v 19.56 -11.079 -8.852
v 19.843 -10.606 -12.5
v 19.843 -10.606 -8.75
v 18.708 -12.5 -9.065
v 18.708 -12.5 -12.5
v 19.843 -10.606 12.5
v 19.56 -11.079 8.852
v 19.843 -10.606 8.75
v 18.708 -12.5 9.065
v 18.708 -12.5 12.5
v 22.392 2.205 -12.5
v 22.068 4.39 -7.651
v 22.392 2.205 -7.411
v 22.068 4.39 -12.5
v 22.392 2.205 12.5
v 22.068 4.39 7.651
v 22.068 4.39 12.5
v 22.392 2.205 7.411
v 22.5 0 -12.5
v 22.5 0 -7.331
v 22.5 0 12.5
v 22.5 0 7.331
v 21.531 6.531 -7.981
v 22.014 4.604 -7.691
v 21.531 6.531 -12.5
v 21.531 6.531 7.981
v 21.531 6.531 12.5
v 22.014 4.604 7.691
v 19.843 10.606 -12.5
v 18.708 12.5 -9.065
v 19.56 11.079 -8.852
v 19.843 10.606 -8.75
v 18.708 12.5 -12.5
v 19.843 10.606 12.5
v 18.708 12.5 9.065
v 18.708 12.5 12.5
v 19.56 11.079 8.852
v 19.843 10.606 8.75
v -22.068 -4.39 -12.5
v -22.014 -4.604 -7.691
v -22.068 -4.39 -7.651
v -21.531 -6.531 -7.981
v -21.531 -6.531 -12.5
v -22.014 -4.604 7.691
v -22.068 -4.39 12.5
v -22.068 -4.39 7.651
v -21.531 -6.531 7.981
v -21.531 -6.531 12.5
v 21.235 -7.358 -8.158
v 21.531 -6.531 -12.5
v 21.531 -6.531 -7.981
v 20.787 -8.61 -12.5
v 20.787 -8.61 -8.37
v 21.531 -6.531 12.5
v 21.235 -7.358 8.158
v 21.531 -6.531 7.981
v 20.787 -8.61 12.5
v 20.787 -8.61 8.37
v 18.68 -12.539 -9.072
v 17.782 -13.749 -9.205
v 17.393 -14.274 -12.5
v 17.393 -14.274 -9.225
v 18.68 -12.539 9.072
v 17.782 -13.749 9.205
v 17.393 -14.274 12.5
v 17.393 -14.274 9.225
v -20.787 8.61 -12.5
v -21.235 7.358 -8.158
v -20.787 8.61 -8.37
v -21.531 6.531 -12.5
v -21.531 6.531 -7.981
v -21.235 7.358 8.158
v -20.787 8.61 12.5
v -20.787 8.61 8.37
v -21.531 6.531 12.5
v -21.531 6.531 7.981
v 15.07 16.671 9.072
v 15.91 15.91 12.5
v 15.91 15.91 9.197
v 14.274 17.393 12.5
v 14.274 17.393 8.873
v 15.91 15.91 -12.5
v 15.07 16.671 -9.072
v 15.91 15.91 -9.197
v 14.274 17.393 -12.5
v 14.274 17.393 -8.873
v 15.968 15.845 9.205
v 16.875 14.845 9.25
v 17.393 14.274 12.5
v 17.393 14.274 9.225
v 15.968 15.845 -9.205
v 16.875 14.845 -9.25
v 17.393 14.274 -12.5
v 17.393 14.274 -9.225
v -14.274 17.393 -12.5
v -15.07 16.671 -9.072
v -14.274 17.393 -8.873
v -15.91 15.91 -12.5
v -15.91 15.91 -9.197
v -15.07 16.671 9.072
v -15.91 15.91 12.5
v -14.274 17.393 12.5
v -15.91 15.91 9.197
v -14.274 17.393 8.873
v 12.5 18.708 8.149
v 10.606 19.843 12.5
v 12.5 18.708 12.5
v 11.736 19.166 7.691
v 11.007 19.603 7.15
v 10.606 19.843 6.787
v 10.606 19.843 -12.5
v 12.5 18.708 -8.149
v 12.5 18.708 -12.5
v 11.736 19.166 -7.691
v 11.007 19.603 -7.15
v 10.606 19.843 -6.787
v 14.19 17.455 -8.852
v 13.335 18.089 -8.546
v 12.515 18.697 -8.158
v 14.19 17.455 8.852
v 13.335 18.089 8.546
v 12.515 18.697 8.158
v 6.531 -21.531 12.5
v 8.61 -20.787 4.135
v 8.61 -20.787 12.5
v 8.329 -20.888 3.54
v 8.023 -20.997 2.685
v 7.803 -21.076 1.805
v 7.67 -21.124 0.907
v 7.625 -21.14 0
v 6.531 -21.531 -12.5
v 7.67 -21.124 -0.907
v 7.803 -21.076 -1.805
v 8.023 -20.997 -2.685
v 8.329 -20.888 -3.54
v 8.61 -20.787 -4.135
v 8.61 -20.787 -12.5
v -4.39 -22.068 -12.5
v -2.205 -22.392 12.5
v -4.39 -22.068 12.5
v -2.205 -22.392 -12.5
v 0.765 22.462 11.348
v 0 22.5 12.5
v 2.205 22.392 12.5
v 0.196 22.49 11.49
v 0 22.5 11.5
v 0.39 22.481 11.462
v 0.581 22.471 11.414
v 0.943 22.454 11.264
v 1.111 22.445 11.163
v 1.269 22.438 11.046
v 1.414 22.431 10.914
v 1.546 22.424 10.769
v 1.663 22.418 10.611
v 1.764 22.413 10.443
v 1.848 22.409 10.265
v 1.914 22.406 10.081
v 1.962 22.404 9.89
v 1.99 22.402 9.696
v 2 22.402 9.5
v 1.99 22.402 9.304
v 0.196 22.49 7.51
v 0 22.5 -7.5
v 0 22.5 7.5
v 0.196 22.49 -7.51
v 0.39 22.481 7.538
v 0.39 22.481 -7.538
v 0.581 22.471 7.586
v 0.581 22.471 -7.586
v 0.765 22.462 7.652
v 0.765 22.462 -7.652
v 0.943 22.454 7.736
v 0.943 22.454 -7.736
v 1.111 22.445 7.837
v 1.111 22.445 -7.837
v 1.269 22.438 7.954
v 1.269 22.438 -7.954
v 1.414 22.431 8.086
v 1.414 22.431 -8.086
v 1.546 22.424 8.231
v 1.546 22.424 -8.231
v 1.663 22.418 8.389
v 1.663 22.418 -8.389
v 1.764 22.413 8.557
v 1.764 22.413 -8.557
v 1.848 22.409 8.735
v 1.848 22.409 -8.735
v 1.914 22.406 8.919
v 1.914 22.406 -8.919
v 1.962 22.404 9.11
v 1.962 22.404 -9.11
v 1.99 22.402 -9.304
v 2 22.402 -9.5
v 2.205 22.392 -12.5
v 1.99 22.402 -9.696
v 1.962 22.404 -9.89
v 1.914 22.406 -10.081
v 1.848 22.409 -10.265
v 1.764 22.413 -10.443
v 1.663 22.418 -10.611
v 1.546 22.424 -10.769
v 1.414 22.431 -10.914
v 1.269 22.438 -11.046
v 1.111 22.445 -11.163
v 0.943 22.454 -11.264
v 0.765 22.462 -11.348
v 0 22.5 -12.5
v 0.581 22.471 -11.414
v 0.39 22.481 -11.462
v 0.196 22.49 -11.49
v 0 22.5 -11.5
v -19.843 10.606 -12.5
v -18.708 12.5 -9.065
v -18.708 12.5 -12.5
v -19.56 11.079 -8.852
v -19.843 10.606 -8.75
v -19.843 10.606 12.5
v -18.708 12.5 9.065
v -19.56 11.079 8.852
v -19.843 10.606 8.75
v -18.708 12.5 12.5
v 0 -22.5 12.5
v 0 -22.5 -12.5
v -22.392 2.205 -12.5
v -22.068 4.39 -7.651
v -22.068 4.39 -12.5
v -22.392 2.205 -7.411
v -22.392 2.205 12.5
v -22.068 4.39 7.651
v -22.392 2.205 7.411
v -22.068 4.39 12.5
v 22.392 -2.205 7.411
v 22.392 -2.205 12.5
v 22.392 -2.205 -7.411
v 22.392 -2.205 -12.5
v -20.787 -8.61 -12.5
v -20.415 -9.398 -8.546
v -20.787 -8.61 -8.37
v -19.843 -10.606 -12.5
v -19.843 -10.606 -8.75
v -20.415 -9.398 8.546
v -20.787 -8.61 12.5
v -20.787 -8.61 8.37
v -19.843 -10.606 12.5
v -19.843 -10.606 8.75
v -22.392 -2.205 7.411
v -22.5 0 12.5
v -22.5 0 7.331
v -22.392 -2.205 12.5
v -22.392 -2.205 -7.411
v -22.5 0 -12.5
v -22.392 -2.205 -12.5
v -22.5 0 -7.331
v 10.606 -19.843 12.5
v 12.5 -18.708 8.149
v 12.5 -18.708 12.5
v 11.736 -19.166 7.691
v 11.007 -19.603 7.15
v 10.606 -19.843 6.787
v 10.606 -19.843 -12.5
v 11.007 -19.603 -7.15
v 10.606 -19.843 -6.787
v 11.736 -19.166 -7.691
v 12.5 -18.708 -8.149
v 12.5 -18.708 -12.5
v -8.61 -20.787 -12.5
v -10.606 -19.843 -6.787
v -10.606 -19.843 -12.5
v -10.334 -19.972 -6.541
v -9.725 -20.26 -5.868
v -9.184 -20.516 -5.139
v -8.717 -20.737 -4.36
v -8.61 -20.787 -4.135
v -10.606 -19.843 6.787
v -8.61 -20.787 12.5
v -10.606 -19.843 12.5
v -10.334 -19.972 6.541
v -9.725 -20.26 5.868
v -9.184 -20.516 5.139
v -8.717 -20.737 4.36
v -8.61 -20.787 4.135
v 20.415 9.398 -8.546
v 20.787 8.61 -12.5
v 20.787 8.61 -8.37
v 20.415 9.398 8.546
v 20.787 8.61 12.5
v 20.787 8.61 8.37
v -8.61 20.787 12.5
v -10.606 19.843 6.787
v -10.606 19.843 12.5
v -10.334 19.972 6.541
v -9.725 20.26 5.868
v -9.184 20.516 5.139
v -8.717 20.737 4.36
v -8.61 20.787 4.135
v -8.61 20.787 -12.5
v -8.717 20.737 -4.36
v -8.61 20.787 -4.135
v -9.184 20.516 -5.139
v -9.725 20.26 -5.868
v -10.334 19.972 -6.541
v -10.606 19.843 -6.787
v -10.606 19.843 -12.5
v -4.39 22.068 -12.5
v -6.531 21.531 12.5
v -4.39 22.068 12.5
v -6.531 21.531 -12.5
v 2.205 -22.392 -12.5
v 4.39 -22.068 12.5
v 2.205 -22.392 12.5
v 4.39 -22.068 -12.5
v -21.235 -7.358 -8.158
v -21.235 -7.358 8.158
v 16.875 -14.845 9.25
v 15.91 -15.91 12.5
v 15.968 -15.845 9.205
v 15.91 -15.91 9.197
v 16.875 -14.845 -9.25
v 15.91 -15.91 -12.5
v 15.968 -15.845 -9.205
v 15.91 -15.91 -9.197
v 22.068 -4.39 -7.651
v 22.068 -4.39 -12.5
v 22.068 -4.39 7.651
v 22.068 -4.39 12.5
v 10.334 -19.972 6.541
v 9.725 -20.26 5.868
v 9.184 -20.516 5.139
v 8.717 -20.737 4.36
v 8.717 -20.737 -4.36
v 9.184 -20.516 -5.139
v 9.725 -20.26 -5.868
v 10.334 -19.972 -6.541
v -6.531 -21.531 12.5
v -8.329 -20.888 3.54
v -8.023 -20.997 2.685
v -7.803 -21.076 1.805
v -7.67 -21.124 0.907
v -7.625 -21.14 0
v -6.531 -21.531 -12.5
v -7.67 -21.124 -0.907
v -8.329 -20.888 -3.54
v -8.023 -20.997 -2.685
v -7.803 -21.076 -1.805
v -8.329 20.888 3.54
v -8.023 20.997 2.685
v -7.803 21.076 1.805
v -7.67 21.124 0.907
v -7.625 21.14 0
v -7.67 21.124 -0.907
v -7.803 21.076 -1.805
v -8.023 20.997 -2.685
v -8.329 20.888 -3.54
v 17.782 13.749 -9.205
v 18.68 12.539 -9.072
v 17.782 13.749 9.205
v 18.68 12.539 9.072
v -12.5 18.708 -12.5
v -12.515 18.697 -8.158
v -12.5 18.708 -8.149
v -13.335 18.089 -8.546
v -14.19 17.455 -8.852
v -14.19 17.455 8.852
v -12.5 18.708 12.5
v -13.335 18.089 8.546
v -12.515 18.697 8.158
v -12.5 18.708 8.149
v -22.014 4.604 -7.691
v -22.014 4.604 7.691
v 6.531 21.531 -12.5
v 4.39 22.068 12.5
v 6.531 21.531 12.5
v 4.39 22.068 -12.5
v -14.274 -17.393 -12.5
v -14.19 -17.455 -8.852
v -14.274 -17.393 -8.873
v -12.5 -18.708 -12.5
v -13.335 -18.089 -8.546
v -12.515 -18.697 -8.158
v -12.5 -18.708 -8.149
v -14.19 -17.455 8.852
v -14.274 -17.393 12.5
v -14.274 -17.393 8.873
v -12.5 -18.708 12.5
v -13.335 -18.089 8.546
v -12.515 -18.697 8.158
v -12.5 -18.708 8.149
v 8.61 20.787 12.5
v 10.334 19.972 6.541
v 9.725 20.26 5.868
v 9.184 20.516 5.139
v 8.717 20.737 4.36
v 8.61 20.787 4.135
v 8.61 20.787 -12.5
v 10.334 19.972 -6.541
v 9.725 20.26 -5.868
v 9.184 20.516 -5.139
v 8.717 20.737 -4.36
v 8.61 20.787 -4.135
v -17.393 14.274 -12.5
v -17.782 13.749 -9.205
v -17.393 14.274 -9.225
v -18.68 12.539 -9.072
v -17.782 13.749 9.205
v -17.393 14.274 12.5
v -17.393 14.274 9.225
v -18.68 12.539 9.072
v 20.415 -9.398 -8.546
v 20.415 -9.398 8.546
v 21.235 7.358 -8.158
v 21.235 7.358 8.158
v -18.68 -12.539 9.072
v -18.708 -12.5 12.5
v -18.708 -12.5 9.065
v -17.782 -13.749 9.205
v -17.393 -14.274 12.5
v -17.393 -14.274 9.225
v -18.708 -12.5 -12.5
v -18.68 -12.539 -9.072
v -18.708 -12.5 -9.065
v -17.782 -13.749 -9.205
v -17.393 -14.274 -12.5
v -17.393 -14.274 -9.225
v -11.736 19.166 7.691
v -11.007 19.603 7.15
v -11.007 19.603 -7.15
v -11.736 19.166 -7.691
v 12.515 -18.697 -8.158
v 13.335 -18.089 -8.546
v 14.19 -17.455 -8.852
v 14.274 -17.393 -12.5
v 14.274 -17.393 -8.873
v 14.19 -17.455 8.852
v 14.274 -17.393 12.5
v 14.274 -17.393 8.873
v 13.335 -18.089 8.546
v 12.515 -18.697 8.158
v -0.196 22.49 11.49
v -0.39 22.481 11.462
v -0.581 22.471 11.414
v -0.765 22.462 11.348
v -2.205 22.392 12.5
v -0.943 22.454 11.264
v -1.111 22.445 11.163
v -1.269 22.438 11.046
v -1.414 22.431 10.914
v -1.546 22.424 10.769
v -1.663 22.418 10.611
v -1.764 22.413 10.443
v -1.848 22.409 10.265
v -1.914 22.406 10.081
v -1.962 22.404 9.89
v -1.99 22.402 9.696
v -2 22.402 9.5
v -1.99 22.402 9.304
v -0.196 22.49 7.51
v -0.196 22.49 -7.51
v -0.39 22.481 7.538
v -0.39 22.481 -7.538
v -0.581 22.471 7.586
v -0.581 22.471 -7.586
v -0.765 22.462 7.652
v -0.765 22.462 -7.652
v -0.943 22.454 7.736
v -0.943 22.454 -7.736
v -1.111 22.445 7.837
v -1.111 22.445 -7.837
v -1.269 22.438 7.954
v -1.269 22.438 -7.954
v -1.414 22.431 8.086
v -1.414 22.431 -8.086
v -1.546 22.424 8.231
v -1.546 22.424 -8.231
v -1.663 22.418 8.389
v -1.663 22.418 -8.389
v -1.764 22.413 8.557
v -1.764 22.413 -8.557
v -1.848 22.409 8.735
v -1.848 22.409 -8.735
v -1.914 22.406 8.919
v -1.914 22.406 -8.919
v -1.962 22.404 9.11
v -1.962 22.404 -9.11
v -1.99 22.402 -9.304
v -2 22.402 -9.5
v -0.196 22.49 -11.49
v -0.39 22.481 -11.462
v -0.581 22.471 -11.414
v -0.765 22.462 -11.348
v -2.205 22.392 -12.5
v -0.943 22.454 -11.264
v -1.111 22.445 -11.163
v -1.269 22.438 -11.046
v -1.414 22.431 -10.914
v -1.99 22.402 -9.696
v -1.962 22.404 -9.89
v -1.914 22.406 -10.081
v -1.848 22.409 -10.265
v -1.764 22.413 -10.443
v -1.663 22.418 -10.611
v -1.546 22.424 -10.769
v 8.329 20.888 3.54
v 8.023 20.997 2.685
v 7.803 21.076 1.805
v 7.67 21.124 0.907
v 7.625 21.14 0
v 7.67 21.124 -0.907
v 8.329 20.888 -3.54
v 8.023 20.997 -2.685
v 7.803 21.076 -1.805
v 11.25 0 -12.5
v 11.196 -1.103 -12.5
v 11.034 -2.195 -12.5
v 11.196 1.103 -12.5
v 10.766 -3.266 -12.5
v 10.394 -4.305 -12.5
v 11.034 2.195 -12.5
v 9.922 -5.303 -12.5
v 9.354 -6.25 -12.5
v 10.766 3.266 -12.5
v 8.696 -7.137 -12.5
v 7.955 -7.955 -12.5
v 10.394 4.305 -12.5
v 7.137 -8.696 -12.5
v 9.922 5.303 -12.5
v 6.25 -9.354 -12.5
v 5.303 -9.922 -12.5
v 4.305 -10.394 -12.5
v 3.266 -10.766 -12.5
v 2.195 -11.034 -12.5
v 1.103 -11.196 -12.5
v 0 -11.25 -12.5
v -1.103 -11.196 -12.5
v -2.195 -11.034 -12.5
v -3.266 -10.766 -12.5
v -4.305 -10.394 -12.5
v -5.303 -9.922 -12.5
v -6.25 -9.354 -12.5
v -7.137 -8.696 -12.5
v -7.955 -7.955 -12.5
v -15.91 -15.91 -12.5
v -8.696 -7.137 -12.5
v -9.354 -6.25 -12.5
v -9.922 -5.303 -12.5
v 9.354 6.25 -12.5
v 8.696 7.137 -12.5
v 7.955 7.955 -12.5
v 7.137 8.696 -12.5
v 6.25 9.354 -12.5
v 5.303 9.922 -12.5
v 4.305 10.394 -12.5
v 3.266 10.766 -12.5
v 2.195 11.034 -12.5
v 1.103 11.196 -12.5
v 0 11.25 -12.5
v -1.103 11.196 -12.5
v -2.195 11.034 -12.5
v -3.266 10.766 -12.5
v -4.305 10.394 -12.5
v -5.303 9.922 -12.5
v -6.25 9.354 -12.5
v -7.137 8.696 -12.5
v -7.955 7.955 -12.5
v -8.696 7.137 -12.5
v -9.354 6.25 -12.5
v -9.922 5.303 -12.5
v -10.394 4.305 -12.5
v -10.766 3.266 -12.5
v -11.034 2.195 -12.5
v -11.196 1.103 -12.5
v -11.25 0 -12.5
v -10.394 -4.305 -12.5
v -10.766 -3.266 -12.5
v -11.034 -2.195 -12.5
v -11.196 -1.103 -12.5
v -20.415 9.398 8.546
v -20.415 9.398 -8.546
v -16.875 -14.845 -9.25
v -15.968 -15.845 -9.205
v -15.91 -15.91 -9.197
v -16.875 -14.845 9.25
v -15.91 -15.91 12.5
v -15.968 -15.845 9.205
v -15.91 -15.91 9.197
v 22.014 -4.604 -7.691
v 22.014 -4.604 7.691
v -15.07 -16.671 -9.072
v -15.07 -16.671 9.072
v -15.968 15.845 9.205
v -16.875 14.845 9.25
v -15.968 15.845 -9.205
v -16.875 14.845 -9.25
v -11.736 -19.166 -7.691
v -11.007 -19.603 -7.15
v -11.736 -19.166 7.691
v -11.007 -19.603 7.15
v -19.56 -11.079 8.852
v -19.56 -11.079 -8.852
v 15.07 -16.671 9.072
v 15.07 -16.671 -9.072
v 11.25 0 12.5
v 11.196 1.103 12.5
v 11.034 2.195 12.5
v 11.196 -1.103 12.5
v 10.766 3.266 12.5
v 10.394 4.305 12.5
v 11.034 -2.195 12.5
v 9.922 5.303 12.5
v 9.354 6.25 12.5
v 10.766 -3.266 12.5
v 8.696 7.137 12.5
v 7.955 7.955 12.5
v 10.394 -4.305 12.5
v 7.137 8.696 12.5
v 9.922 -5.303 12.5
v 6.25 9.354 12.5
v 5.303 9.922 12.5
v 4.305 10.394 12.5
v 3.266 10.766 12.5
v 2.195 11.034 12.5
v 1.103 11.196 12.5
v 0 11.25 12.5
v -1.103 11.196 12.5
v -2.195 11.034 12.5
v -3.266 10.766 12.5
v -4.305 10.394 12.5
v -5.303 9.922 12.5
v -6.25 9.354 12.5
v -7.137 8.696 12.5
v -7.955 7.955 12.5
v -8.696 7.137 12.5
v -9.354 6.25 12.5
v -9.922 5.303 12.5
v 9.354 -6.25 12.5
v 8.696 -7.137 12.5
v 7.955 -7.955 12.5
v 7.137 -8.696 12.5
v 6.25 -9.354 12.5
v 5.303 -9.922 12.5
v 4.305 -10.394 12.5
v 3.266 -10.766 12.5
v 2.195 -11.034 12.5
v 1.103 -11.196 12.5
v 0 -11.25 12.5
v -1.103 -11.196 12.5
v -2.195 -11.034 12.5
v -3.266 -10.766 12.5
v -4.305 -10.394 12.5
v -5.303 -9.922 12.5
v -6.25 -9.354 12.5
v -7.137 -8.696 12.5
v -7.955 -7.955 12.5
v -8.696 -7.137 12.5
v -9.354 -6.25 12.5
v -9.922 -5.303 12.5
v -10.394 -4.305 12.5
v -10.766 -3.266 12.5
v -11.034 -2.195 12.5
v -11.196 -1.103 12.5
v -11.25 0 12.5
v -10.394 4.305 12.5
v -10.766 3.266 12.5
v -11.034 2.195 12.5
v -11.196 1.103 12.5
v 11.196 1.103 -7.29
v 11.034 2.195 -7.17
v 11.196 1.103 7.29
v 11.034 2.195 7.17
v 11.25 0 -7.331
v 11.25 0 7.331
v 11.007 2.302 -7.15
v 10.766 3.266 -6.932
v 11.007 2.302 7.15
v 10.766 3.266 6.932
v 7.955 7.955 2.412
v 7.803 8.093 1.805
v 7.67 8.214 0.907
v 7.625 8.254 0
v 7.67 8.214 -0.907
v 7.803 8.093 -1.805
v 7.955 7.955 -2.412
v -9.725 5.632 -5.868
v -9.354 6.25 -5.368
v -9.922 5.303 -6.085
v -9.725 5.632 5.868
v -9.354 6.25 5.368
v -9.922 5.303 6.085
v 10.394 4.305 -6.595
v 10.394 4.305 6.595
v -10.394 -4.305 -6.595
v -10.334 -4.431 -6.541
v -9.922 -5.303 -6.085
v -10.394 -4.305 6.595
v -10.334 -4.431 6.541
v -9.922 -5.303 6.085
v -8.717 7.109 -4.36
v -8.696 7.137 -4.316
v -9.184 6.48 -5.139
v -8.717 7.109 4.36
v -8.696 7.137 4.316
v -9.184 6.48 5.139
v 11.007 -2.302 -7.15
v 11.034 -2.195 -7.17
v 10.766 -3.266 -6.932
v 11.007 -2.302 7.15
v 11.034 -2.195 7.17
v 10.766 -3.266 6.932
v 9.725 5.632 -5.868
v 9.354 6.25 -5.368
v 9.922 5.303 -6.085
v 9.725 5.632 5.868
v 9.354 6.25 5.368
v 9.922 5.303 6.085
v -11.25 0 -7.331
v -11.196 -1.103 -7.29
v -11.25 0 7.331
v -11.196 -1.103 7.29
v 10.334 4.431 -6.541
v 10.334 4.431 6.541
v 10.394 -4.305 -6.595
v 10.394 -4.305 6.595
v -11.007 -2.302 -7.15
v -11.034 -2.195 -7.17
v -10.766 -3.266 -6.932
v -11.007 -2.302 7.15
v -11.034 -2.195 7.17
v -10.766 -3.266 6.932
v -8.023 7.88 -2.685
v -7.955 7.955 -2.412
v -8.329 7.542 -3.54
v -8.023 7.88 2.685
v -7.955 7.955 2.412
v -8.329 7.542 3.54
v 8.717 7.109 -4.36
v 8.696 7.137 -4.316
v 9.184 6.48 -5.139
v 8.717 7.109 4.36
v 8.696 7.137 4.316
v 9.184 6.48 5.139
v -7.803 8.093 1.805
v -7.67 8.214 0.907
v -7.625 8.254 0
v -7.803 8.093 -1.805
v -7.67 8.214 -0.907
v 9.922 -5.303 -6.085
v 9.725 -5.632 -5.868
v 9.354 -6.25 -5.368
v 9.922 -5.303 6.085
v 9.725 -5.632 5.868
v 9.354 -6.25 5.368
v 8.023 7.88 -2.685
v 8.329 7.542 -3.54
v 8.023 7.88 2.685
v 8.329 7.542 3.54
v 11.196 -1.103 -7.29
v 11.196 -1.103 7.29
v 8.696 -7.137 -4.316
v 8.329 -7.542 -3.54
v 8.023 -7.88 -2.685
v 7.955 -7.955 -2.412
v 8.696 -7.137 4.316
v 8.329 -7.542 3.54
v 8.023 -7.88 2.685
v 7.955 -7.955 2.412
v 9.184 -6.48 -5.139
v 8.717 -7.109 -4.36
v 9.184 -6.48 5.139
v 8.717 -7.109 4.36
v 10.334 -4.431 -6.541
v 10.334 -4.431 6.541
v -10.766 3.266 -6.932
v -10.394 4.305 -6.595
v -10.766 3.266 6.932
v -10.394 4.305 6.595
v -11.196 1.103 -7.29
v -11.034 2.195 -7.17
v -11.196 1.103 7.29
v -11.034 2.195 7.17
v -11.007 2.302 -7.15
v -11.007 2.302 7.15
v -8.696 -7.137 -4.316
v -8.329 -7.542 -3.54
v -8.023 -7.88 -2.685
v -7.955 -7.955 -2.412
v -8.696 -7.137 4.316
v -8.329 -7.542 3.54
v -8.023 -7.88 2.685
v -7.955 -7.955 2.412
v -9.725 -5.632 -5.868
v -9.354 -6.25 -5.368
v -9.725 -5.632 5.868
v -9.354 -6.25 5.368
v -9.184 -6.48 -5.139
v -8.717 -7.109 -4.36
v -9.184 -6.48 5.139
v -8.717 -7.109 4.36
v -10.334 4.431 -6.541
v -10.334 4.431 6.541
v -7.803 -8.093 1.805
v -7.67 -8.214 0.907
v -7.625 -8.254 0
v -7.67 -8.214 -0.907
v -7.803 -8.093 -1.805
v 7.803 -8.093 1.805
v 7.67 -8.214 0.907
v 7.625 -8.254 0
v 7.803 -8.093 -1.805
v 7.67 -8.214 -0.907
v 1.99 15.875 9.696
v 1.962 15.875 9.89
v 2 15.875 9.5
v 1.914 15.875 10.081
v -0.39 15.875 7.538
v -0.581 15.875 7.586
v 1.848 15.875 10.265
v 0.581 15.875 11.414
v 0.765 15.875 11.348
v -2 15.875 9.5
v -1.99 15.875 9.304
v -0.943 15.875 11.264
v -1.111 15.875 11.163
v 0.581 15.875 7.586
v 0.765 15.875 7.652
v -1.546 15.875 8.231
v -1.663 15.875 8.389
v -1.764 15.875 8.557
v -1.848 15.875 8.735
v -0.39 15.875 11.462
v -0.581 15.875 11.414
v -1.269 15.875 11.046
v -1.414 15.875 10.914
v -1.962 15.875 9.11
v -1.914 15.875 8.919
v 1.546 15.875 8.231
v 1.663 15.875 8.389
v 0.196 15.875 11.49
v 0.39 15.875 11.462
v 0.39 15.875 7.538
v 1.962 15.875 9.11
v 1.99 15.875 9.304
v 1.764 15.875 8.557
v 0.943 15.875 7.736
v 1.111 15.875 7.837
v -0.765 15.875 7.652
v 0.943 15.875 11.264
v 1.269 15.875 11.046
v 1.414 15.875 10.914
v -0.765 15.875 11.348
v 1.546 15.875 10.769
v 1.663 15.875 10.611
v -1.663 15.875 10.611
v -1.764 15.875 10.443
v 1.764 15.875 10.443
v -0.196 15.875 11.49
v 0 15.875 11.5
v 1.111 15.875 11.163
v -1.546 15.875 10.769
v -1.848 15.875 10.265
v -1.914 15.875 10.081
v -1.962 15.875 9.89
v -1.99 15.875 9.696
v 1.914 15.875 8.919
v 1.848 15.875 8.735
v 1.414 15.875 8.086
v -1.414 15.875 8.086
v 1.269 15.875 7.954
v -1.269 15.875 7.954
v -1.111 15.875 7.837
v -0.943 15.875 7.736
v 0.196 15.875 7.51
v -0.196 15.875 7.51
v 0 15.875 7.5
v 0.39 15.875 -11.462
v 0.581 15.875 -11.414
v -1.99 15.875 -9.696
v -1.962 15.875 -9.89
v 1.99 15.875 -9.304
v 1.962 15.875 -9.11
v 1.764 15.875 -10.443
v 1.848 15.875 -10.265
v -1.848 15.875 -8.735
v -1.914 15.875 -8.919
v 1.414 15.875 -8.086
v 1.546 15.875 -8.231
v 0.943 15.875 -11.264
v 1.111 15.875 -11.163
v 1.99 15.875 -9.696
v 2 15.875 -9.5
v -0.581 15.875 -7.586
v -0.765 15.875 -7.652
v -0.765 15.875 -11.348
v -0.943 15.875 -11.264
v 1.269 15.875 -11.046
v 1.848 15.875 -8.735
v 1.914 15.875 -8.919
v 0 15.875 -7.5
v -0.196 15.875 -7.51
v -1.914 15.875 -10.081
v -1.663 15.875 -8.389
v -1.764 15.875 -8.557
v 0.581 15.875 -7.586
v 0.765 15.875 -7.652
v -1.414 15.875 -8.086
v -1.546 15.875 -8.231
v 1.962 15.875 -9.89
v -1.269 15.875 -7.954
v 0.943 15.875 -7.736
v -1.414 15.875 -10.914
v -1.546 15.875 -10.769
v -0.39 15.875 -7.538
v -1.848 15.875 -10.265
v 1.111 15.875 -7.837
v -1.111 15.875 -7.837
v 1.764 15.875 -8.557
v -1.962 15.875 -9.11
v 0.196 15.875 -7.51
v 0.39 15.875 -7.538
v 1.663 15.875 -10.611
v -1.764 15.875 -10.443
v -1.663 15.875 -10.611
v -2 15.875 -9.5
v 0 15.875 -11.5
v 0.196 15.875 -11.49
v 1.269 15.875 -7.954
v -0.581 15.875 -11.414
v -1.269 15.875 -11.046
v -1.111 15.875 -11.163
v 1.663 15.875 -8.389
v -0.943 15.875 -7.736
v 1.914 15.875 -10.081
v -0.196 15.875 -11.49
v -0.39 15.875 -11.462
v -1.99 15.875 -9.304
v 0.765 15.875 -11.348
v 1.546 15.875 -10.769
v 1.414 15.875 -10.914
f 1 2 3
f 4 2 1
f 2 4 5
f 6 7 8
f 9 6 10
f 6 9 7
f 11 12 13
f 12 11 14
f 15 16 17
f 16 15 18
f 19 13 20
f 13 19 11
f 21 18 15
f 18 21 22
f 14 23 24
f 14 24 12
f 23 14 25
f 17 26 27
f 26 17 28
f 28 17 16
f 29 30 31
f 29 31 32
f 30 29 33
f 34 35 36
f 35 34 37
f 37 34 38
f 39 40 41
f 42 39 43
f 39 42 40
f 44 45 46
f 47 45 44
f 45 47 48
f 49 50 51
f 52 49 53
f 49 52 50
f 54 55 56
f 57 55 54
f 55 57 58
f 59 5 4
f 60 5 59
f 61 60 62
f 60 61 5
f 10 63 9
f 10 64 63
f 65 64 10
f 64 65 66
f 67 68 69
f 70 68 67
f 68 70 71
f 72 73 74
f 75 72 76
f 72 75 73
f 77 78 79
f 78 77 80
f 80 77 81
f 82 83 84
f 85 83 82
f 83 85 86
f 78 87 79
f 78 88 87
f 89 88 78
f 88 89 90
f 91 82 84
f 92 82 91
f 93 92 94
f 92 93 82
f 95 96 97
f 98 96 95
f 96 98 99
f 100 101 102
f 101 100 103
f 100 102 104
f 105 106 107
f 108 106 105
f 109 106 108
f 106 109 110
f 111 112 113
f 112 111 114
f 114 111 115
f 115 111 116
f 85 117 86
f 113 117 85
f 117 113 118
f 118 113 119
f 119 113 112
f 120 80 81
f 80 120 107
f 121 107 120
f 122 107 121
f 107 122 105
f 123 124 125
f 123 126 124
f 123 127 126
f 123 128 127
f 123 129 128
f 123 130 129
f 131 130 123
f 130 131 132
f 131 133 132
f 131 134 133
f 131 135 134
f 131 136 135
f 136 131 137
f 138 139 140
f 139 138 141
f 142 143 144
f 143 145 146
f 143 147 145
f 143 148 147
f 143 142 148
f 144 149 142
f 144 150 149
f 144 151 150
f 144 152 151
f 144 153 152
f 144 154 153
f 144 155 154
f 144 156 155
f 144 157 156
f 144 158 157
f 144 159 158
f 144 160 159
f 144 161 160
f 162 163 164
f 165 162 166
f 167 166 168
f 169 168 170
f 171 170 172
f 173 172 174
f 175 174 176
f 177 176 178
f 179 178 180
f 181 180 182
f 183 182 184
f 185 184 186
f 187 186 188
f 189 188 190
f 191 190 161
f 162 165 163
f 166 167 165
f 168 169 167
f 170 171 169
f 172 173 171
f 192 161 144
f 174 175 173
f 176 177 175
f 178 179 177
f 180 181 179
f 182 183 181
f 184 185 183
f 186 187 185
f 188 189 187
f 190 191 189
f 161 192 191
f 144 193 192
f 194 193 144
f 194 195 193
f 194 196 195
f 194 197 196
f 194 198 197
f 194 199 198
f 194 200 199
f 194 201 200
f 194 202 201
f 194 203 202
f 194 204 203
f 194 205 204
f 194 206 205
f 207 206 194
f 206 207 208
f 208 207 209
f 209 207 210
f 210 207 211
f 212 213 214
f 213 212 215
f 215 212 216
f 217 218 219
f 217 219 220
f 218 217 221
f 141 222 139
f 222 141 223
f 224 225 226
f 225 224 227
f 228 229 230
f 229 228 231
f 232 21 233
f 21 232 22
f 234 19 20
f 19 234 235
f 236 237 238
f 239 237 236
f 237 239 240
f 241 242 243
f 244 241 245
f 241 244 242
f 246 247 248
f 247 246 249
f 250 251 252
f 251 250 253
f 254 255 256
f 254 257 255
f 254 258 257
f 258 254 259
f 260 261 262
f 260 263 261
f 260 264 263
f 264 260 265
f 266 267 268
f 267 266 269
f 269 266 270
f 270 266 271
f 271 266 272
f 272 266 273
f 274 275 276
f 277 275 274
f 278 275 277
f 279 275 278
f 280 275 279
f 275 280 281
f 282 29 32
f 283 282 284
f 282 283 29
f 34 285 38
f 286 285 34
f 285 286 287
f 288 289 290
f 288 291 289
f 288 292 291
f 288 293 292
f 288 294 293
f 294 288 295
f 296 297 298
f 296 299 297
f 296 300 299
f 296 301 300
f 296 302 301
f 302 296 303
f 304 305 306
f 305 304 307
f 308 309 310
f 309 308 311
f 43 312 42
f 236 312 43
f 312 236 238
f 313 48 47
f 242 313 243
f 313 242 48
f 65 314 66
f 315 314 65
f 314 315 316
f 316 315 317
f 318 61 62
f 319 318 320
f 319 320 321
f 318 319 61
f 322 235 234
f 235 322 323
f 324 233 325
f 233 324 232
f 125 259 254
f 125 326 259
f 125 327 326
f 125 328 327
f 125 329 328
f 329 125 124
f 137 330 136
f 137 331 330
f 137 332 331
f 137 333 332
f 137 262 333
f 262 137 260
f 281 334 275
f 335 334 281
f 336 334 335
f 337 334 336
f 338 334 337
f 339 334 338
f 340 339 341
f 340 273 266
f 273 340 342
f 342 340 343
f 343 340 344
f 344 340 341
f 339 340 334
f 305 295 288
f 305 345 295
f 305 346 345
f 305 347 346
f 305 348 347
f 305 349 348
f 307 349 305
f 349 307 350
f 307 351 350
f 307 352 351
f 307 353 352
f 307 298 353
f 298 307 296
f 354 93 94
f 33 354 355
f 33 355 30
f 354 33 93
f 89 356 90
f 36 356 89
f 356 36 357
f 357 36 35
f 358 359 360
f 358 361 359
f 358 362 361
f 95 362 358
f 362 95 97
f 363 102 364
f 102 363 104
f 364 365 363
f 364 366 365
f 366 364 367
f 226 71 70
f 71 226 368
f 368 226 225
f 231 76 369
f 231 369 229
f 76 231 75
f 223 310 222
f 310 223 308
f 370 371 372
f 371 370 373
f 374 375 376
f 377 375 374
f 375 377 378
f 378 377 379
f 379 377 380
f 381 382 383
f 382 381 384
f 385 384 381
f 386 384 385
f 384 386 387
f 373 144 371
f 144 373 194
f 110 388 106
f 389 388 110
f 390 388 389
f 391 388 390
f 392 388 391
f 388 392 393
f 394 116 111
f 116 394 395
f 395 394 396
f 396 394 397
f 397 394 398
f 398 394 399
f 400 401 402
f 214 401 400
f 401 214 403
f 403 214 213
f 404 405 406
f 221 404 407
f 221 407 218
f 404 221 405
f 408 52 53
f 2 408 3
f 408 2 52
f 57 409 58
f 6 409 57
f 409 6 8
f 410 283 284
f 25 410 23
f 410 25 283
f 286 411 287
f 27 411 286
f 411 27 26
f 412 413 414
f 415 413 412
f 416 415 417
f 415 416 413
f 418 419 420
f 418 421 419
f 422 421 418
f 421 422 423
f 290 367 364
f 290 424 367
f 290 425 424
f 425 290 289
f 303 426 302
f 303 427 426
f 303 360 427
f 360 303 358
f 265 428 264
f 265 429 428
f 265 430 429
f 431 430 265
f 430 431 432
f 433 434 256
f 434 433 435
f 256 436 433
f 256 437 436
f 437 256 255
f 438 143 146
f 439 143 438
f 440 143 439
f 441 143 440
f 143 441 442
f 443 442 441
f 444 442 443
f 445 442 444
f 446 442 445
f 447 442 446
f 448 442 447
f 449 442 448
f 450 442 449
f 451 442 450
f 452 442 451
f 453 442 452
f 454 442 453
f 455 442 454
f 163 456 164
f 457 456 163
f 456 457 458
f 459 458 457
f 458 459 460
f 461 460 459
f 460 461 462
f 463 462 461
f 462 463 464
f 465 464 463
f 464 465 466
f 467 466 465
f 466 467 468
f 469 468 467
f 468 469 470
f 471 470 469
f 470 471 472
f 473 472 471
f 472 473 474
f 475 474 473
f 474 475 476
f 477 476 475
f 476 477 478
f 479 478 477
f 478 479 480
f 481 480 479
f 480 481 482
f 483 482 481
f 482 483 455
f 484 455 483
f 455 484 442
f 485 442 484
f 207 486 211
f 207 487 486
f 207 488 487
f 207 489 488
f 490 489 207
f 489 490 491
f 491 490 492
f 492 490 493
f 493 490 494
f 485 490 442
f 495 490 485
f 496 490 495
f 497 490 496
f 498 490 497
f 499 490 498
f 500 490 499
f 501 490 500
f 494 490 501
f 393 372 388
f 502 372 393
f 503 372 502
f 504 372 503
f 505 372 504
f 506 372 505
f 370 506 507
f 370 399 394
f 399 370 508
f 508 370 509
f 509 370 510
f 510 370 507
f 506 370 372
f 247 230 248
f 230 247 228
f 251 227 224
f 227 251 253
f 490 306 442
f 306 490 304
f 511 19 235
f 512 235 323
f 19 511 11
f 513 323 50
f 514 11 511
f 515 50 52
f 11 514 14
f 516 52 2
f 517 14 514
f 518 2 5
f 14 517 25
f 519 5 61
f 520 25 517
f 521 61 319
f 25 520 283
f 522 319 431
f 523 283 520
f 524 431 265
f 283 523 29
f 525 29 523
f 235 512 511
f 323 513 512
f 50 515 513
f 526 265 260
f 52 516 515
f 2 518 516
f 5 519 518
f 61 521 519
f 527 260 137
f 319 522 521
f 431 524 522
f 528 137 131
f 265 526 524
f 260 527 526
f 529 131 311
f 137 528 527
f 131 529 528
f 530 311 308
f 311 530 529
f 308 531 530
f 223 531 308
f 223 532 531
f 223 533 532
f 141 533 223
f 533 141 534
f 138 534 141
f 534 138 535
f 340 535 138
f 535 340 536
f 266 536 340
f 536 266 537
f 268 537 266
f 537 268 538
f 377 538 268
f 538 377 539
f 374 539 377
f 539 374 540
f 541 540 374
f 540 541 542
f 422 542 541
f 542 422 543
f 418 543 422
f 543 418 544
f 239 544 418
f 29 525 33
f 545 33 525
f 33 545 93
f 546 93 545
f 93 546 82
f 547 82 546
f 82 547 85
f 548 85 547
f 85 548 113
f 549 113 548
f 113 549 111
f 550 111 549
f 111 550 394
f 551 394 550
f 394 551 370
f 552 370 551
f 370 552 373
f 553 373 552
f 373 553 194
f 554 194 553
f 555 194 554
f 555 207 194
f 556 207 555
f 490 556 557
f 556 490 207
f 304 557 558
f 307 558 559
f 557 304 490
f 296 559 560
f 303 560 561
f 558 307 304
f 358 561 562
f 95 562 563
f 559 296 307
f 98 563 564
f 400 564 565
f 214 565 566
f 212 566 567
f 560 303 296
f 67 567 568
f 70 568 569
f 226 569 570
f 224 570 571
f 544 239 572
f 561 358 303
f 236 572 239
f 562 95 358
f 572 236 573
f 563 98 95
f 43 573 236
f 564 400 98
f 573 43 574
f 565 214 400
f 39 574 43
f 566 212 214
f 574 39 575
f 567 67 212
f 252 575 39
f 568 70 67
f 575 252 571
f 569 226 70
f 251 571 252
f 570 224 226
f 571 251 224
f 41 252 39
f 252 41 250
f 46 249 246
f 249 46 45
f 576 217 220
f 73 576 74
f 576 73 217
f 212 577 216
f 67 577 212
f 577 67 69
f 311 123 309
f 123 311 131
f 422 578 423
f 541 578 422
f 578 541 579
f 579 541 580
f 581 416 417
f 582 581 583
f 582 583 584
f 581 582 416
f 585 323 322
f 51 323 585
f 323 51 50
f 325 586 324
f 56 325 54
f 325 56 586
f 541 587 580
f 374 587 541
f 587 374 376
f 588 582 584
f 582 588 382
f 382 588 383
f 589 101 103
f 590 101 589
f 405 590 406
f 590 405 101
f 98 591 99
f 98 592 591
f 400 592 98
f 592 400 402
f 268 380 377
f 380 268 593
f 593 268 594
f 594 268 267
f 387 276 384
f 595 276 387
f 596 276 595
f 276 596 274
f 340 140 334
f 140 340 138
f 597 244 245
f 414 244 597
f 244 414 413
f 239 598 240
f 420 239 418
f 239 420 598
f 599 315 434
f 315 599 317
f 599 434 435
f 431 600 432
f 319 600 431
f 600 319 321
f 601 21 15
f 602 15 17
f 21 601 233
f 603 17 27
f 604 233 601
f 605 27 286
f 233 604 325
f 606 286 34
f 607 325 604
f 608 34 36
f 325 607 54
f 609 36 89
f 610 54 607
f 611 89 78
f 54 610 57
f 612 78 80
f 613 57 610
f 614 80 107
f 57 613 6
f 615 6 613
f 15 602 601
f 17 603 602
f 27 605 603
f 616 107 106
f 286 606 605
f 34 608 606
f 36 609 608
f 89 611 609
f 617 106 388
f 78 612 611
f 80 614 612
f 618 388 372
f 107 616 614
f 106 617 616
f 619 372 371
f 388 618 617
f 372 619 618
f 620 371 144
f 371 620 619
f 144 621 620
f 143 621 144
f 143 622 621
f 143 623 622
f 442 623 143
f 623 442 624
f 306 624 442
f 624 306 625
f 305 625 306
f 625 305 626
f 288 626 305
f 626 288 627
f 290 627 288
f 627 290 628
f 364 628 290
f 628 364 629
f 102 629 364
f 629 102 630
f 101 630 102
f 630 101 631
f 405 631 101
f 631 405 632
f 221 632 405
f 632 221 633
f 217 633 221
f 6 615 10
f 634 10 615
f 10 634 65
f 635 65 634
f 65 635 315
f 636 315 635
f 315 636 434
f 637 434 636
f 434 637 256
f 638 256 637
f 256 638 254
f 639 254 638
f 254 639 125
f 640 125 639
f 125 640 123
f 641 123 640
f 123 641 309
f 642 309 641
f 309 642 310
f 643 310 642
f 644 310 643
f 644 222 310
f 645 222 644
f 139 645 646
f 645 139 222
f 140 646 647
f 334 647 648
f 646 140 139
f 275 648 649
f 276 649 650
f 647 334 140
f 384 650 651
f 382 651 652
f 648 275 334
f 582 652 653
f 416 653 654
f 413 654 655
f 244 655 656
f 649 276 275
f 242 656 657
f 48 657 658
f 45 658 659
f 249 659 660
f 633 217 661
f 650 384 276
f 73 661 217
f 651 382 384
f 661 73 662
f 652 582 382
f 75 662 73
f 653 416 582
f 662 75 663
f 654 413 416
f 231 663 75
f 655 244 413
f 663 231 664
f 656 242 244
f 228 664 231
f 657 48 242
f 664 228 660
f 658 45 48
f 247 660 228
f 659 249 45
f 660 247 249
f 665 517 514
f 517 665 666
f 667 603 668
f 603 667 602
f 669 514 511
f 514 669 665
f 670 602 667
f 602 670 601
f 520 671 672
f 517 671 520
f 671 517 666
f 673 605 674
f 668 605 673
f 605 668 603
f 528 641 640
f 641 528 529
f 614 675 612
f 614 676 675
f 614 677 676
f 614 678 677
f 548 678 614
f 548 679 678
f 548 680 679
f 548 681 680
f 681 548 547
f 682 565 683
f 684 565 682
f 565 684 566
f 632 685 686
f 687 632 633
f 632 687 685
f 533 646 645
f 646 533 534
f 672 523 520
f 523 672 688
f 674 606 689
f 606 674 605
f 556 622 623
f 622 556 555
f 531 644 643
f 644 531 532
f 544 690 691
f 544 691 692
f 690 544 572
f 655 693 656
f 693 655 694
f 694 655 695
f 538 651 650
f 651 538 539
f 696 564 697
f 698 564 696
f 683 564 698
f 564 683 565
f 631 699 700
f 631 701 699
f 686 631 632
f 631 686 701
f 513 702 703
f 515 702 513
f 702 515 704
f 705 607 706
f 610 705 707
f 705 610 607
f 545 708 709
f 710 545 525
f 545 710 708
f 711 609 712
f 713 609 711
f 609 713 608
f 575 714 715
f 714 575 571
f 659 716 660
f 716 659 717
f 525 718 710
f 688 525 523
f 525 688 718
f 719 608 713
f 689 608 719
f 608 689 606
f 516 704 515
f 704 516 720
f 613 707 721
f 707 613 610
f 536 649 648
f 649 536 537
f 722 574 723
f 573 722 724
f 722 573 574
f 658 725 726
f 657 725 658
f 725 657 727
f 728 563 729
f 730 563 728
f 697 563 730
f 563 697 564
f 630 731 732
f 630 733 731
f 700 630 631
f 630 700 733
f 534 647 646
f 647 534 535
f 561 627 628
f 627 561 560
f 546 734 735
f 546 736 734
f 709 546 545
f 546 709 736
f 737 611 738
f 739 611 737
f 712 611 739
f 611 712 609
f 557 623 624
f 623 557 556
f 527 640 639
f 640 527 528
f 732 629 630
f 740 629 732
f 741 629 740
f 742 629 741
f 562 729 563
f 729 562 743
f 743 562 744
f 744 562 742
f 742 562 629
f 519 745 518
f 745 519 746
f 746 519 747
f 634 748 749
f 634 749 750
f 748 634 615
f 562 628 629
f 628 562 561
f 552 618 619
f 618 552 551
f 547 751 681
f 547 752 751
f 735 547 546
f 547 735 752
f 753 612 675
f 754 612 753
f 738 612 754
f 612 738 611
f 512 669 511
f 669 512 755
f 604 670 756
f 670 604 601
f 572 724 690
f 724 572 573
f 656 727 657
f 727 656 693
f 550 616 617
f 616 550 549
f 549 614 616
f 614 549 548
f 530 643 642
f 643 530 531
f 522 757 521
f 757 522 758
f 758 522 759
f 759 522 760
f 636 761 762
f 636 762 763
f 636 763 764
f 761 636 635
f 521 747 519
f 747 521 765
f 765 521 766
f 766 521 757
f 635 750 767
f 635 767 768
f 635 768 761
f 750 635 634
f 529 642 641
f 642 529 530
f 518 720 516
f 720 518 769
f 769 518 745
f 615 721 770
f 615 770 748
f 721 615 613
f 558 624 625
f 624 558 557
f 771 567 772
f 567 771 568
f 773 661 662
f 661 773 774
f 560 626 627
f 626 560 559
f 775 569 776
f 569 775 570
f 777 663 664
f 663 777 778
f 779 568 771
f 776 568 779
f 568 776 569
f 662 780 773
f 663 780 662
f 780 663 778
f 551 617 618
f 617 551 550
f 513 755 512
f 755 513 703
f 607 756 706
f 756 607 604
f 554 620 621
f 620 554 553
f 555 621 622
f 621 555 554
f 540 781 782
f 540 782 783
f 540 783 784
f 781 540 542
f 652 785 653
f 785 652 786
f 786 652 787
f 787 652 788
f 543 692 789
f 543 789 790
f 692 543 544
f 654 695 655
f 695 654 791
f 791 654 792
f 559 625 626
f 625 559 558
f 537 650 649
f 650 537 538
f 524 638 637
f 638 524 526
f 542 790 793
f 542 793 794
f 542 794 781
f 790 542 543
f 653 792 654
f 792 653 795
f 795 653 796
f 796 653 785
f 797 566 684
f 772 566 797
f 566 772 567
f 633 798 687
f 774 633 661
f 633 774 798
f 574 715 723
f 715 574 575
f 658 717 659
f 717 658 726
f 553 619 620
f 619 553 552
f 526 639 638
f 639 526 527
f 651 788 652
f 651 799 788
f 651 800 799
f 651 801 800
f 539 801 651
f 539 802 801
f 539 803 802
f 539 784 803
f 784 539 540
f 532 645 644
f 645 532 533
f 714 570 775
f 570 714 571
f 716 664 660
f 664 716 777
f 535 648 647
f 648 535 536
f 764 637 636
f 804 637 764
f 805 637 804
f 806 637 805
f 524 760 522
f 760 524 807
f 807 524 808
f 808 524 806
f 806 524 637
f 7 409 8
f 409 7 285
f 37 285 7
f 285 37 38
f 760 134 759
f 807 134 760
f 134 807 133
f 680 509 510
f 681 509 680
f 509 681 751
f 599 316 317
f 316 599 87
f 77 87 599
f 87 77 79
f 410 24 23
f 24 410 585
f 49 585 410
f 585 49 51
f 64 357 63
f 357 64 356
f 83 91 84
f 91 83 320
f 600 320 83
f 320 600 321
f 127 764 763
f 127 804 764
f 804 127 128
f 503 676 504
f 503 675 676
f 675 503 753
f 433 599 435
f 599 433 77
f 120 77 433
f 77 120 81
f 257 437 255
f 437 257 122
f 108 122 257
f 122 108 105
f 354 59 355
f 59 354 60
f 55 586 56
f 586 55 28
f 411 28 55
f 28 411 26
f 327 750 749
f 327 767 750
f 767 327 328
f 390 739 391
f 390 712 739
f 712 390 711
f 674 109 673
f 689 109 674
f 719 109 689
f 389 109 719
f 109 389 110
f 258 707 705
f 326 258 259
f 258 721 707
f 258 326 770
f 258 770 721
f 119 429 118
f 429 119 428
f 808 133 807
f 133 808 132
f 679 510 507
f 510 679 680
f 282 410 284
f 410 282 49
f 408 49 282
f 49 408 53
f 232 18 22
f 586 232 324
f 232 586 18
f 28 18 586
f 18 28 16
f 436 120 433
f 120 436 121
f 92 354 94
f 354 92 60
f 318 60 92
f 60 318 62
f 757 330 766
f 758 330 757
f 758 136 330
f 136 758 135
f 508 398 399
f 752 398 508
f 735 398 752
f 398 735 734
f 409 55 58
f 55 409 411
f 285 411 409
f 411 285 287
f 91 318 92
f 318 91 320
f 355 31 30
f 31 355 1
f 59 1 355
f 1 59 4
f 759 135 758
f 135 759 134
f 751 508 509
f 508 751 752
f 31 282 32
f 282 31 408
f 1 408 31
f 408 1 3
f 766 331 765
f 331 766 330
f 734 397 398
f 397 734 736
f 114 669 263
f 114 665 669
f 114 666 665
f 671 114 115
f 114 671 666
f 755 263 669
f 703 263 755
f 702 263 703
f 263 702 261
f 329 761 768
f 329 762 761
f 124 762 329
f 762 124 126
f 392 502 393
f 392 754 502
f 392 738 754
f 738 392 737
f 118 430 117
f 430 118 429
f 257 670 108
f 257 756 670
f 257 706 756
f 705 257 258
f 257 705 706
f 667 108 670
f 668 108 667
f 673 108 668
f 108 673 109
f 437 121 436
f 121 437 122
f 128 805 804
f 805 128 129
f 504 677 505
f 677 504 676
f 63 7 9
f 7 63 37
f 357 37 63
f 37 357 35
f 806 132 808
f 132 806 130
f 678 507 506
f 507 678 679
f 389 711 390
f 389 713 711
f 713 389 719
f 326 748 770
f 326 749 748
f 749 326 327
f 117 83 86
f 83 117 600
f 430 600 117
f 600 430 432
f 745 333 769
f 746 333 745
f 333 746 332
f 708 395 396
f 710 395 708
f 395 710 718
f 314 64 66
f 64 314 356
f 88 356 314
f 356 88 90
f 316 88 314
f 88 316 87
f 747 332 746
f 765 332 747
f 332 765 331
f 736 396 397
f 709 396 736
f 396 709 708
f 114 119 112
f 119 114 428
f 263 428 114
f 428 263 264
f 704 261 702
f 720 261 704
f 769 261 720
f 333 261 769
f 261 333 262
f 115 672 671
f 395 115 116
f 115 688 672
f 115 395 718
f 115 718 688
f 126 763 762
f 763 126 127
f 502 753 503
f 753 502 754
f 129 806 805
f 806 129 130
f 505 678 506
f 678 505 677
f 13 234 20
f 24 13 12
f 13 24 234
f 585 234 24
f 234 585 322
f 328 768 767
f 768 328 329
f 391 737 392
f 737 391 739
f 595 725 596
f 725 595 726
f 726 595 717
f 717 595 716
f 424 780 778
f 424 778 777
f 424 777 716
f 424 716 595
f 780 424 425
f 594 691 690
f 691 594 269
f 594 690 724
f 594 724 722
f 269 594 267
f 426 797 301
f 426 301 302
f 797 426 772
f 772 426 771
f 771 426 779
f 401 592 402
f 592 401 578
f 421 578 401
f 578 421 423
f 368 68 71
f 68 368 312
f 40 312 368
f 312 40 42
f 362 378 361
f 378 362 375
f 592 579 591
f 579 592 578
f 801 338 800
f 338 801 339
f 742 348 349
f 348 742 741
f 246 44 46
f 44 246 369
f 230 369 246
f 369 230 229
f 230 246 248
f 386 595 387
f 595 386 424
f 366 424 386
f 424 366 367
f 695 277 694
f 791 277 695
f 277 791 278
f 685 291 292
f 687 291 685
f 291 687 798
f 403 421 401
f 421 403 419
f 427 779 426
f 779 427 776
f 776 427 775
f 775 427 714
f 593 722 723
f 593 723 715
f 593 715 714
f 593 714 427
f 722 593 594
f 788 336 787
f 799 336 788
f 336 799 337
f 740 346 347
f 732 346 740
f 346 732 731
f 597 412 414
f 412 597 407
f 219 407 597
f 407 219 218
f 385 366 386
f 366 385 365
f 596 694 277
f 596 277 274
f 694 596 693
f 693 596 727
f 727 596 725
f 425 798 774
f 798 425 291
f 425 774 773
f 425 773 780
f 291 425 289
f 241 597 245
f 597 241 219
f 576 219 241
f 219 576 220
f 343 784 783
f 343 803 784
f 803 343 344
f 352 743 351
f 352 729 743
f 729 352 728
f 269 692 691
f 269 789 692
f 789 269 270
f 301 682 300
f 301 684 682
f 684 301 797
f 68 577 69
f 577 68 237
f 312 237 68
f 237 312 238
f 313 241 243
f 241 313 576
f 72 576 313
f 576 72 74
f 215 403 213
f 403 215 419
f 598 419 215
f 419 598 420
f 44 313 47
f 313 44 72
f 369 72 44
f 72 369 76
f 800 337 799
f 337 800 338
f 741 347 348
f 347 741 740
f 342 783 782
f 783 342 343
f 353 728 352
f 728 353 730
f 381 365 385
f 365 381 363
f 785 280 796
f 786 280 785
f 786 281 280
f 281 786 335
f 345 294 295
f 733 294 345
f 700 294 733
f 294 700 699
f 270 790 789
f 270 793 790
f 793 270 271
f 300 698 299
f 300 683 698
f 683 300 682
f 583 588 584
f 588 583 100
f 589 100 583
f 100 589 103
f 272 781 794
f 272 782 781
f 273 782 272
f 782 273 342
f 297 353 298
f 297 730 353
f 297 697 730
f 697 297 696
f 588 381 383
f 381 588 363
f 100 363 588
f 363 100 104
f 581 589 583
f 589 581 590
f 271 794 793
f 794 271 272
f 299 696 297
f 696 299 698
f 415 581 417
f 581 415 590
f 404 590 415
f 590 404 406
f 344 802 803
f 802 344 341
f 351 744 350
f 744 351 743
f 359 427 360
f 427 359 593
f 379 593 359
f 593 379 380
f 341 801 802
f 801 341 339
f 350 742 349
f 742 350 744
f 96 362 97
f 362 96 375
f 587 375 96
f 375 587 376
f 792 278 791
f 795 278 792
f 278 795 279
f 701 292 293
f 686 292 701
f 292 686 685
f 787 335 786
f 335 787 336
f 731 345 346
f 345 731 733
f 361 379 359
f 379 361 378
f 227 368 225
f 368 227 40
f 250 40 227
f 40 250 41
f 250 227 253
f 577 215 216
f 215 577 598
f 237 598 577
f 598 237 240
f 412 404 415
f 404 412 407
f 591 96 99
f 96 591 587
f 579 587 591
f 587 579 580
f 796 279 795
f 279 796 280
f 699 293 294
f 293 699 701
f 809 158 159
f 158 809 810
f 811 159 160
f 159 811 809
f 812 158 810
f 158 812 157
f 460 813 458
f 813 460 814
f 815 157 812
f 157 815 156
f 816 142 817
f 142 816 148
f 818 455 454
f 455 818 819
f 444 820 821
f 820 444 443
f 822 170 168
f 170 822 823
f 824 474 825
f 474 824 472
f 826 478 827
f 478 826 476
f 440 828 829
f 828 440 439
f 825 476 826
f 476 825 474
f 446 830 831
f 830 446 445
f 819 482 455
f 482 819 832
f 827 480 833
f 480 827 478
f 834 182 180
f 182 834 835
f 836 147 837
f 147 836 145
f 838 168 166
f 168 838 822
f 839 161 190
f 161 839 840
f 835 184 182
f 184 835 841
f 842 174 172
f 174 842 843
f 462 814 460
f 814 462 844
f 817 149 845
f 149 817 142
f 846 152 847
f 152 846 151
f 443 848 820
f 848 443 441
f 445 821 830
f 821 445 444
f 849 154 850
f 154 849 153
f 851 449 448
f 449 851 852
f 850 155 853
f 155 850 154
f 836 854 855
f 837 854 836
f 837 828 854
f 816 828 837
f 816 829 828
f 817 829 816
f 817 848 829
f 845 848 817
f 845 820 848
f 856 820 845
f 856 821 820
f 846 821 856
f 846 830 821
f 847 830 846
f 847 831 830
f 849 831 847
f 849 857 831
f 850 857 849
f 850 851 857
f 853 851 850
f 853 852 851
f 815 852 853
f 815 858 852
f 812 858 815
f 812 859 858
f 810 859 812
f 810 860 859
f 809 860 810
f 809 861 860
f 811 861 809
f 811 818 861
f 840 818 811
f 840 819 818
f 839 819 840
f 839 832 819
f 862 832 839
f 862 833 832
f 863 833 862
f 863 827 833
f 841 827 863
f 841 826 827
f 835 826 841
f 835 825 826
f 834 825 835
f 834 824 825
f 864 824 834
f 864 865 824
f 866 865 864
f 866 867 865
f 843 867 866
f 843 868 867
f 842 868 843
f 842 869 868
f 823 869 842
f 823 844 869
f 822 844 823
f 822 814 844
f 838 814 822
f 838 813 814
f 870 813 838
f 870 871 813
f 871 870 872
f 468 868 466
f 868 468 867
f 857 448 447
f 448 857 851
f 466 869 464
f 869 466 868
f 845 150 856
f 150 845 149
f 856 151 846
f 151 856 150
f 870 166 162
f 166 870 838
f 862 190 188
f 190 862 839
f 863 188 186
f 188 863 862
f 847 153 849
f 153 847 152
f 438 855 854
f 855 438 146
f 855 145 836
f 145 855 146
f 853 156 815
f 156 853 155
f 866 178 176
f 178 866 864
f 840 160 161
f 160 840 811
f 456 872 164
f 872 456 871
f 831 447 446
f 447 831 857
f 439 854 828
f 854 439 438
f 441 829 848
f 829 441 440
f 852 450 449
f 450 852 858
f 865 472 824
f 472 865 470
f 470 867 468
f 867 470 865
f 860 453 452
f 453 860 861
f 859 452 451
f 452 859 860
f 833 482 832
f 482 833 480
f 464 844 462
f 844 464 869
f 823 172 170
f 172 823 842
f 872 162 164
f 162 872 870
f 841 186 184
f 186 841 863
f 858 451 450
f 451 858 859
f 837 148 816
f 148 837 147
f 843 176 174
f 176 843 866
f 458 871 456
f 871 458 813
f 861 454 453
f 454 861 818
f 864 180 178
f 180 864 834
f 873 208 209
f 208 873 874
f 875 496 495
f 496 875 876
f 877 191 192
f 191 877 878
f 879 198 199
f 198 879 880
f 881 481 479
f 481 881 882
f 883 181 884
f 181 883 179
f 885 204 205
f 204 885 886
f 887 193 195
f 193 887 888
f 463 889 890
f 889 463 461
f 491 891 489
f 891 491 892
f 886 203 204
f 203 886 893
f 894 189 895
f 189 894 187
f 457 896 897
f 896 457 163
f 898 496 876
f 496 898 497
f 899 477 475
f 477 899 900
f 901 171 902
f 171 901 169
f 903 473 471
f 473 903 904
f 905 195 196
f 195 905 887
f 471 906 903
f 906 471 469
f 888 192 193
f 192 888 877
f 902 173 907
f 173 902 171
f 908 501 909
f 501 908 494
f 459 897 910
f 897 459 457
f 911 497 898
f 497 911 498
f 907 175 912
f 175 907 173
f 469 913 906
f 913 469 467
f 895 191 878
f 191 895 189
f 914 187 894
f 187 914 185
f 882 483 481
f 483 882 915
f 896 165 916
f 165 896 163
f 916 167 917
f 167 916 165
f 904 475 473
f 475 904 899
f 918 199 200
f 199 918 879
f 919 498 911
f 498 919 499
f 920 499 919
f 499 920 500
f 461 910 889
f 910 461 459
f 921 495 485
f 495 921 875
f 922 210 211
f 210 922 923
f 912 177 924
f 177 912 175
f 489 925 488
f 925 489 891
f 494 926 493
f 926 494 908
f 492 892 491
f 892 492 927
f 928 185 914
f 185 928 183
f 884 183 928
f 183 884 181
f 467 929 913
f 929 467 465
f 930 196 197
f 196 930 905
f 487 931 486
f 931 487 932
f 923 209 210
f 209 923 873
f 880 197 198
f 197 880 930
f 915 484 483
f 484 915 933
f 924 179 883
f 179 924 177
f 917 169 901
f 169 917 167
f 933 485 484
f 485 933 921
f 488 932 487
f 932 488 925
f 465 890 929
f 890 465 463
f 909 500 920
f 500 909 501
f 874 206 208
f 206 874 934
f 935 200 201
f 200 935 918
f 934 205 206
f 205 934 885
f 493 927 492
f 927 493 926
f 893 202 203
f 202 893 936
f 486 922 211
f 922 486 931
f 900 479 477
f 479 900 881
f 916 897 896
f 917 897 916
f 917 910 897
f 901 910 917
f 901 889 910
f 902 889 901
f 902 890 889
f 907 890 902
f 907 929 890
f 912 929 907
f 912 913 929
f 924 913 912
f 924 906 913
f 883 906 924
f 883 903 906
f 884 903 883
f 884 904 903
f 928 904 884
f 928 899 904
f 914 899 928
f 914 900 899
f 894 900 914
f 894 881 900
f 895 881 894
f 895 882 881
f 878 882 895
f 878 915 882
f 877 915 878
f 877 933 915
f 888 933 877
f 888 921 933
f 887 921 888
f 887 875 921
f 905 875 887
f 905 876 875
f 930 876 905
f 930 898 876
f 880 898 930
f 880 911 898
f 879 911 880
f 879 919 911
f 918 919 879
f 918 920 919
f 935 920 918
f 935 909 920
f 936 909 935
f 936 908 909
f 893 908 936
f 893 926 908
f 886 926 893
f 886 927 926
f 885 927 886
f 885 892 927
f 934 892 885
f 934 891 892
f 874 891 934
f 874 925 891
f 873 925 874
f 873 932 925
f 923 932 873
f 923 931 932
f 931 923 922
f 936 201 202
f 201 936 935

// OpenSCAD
// COBRA Vertebra - L2 V20
// Height: 25.0mm, OD: 45.0mm

$fn = 64;

difference() {
    // Outer cylinder
    cylinder(h=25.0, d=45.0, center=true);
    
    // Inner channel
    cylinder(h=27.0, d=22.5, center=true);

    // Battery cavity 1
    rotate([0, 0, 0])
    translate([16.875, 0, 0])
    rotate([90, 0, 0])
    cylinder(h=74.0, d=18.5, center=true);

    // Battery cavity 2
    rotate([0, 0, 180])
    translate([16.875, 0, 0])
    rotate([90, 0, 0])
    cylinder(h=74.0, d=18.5, center=true);

    // Pivot holes
    translate([0, 22.5, 9.5])
    rotate([90, 0, 0])
    cylinder(h=13.25, d=4, center=true);
    
    translate([0, 22.5, -9.5])
    rotate([90, 0, 0])
    cylinder(h=13.25, d=4, center=true);
}
